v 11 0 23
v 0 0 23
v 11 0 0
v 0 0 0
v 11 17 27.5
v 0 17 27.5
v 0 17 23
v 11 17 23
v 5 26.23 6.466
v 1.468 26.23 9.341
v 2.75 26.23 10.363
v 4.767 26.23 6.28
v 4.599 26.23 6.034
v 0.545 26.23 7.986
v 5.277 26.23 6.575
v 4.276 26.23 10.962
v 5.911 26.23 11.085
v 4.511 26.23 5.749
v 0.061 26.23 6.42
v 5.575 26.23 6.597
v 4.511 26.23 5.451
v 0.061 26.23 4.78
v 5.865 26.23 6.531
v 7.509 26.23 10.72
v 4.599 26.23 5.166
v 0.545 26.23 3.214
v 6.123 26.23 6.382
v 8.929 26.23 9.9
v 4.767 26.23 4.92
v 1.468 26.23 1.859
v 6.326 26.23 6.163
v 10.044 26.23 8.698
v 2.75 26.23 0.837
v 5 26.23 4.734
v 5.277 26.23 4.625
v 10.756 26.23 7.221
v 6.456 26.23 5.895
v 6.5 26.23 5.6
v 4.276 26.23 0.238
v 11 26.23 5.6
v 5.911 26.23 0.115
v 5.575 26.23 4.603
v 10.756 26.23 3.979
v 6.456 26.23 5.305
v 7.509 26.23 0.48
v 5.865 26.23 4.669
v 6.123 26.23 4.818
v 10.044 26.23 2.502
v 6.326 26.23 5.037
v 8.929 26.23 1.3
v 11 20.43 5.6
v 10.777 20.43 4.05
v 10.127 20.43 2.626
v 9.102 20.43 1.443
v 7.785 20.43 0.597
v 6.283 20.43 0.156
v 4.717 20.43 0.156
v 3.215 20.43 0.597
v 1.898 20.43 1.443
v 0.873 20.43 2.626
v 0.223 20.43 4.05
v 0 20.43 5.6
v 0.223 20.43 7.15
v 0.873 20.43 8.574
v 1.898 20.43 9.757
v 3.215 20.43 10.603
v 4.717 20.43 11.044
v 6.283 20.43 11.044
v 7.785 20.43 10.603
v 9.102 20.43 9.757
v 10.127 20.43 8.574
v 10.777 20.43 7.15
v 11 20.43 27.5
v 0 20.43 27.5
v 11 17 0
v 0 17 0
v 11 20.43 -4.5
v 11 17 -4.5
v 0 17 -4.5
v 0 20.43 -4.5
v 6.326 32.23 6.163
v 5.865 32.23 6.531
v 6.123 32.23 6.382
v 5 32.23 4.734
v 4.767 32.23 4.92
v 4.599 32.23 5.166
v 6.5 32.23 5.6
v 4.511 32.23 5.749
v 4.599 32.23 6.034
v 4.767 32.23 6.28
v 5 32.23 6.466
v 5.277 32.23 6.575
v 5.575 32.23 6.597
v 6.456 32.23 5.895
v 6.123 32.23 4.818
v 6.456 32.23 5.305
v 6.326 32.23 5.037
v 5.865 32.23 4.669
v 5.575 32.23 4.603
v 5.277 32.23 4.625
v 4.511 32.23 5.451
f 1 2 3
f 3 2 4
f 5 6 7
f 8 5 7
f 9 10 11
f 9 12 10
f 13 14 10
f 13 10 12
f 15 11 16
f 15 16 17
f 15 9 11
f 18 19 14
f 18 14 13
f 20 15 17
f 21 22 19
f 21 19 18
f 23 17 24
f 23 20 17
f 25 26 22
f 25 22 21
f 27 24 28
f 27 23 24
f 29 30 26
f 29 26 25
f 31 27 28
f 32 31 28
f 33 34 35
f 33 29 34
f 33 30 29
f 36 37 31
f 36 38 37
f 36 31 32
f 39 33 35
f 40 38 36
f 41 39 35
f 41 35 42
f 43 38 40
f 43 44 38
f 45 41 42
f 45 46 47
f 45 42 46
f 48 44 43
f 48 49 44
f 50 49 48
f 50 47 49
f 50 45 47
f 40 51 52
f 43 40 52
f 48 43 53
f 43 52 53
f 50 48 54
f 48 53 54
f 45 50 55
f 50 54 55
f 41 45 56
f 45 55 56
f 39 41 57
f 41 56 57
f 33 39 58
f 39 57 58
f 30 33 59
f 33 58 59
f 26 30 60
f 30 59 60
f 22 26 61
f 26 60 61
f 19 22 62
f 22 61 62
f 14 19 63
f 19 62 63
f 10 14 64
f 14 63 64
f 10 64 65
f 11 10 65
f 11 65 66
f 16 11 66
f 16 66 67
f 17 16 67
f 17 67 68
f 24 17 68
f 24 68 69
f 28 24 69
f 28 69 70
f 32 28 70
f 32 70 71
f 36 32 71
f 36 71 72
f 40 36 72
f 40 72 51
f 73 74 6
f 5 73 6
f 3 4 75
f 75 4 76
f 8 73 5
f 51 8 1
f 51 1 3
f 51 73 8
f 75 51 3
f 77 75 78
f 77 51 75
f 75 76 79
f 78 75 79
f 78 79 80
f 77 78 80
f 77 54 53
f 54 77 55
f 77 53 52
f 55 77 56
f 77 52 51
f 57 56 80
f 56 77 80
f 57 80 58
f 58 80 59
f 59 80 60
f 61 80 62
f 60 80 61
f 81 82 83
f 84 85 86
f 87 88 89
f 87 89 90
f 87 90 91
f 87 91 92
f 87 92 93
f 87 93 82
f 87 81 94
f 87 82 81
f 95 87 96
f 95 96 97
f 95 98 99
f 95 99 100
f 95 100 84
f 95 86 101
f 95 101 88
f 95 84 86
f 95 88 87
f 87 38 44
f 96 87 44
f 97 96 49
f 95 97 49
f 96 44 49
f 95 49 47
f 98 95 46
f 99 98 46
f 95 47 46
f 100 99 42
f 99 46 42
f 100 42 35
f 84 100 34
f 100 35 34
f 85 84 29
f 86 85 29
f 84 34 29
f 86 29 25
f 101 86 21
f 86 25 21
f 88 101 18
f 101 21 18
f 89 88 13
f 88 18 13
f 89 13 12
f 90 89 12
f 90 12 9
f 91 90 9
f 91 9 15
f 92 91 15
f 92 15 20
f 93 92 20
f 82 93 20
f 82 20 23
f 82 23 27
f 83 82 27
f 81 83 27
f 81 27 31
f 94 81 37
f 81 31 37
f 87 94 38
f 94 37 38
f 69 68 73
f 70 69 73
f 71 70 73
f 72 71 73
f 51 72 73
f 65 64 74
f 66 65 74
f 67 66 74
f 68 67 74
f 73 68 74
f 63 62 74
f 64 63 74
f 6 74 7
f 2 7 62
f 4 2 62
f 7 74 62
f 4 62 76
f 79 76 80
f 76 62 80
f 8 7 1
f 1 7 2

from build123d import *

# Parameters (mm, degrees)
BOSS_EXTRU_1_DEPTH = 11
ESQUISSE2_R        = 5.5
BOSS_EXTRU_2_DEPTH = 5.8
ESQUISSE7_R        = 1
BOSS_EXTRU_3_DEPTH = 6


with BuildPart() as part:
    # Esquisse1 → Boss.-Extru.1 (new body)
    with BuildSketch(Plane(origin=(0, 0, 0), x_dir=(0, 0, -1), z_dir=(1, 0, 0))):
        Polygon((0, 17), (4.5, 17), (4.5, 20.43), (-27.5, 20.43), (-27.5, 17), (-23, 17), (-23, 0), (0, 0), align=None)
    extrude(amount=BOSS_EXTRU_1_DEPTH)

    # Esquisse2 → Boss.-Extru.2 (add)
    with BuildSketch(Plane(origin=(0, 20.43, 0), x_dir=(1, 0, 0), z_dir=(0, 1, 0))):
        with Locations((5.5, -5.6)):
            Circle(ESQUISSE2_R)
    extrude(amount=BOSS_EXTRU_2_DEPTH)

    # Esquisse7 → Boss.-Extru.3 (add)
    with BuildSketch(Plane(origin=(0, 26.23, 0), x_dir=(1, 0, 0), z_dir=(0, 1, 0))):
        with Locations((5.5, -5.6)):
            Circle(ESQUISSE7_R)
    extrude(amount=BOSS_EXTRU_3_DEPTH)


solid = part.part
